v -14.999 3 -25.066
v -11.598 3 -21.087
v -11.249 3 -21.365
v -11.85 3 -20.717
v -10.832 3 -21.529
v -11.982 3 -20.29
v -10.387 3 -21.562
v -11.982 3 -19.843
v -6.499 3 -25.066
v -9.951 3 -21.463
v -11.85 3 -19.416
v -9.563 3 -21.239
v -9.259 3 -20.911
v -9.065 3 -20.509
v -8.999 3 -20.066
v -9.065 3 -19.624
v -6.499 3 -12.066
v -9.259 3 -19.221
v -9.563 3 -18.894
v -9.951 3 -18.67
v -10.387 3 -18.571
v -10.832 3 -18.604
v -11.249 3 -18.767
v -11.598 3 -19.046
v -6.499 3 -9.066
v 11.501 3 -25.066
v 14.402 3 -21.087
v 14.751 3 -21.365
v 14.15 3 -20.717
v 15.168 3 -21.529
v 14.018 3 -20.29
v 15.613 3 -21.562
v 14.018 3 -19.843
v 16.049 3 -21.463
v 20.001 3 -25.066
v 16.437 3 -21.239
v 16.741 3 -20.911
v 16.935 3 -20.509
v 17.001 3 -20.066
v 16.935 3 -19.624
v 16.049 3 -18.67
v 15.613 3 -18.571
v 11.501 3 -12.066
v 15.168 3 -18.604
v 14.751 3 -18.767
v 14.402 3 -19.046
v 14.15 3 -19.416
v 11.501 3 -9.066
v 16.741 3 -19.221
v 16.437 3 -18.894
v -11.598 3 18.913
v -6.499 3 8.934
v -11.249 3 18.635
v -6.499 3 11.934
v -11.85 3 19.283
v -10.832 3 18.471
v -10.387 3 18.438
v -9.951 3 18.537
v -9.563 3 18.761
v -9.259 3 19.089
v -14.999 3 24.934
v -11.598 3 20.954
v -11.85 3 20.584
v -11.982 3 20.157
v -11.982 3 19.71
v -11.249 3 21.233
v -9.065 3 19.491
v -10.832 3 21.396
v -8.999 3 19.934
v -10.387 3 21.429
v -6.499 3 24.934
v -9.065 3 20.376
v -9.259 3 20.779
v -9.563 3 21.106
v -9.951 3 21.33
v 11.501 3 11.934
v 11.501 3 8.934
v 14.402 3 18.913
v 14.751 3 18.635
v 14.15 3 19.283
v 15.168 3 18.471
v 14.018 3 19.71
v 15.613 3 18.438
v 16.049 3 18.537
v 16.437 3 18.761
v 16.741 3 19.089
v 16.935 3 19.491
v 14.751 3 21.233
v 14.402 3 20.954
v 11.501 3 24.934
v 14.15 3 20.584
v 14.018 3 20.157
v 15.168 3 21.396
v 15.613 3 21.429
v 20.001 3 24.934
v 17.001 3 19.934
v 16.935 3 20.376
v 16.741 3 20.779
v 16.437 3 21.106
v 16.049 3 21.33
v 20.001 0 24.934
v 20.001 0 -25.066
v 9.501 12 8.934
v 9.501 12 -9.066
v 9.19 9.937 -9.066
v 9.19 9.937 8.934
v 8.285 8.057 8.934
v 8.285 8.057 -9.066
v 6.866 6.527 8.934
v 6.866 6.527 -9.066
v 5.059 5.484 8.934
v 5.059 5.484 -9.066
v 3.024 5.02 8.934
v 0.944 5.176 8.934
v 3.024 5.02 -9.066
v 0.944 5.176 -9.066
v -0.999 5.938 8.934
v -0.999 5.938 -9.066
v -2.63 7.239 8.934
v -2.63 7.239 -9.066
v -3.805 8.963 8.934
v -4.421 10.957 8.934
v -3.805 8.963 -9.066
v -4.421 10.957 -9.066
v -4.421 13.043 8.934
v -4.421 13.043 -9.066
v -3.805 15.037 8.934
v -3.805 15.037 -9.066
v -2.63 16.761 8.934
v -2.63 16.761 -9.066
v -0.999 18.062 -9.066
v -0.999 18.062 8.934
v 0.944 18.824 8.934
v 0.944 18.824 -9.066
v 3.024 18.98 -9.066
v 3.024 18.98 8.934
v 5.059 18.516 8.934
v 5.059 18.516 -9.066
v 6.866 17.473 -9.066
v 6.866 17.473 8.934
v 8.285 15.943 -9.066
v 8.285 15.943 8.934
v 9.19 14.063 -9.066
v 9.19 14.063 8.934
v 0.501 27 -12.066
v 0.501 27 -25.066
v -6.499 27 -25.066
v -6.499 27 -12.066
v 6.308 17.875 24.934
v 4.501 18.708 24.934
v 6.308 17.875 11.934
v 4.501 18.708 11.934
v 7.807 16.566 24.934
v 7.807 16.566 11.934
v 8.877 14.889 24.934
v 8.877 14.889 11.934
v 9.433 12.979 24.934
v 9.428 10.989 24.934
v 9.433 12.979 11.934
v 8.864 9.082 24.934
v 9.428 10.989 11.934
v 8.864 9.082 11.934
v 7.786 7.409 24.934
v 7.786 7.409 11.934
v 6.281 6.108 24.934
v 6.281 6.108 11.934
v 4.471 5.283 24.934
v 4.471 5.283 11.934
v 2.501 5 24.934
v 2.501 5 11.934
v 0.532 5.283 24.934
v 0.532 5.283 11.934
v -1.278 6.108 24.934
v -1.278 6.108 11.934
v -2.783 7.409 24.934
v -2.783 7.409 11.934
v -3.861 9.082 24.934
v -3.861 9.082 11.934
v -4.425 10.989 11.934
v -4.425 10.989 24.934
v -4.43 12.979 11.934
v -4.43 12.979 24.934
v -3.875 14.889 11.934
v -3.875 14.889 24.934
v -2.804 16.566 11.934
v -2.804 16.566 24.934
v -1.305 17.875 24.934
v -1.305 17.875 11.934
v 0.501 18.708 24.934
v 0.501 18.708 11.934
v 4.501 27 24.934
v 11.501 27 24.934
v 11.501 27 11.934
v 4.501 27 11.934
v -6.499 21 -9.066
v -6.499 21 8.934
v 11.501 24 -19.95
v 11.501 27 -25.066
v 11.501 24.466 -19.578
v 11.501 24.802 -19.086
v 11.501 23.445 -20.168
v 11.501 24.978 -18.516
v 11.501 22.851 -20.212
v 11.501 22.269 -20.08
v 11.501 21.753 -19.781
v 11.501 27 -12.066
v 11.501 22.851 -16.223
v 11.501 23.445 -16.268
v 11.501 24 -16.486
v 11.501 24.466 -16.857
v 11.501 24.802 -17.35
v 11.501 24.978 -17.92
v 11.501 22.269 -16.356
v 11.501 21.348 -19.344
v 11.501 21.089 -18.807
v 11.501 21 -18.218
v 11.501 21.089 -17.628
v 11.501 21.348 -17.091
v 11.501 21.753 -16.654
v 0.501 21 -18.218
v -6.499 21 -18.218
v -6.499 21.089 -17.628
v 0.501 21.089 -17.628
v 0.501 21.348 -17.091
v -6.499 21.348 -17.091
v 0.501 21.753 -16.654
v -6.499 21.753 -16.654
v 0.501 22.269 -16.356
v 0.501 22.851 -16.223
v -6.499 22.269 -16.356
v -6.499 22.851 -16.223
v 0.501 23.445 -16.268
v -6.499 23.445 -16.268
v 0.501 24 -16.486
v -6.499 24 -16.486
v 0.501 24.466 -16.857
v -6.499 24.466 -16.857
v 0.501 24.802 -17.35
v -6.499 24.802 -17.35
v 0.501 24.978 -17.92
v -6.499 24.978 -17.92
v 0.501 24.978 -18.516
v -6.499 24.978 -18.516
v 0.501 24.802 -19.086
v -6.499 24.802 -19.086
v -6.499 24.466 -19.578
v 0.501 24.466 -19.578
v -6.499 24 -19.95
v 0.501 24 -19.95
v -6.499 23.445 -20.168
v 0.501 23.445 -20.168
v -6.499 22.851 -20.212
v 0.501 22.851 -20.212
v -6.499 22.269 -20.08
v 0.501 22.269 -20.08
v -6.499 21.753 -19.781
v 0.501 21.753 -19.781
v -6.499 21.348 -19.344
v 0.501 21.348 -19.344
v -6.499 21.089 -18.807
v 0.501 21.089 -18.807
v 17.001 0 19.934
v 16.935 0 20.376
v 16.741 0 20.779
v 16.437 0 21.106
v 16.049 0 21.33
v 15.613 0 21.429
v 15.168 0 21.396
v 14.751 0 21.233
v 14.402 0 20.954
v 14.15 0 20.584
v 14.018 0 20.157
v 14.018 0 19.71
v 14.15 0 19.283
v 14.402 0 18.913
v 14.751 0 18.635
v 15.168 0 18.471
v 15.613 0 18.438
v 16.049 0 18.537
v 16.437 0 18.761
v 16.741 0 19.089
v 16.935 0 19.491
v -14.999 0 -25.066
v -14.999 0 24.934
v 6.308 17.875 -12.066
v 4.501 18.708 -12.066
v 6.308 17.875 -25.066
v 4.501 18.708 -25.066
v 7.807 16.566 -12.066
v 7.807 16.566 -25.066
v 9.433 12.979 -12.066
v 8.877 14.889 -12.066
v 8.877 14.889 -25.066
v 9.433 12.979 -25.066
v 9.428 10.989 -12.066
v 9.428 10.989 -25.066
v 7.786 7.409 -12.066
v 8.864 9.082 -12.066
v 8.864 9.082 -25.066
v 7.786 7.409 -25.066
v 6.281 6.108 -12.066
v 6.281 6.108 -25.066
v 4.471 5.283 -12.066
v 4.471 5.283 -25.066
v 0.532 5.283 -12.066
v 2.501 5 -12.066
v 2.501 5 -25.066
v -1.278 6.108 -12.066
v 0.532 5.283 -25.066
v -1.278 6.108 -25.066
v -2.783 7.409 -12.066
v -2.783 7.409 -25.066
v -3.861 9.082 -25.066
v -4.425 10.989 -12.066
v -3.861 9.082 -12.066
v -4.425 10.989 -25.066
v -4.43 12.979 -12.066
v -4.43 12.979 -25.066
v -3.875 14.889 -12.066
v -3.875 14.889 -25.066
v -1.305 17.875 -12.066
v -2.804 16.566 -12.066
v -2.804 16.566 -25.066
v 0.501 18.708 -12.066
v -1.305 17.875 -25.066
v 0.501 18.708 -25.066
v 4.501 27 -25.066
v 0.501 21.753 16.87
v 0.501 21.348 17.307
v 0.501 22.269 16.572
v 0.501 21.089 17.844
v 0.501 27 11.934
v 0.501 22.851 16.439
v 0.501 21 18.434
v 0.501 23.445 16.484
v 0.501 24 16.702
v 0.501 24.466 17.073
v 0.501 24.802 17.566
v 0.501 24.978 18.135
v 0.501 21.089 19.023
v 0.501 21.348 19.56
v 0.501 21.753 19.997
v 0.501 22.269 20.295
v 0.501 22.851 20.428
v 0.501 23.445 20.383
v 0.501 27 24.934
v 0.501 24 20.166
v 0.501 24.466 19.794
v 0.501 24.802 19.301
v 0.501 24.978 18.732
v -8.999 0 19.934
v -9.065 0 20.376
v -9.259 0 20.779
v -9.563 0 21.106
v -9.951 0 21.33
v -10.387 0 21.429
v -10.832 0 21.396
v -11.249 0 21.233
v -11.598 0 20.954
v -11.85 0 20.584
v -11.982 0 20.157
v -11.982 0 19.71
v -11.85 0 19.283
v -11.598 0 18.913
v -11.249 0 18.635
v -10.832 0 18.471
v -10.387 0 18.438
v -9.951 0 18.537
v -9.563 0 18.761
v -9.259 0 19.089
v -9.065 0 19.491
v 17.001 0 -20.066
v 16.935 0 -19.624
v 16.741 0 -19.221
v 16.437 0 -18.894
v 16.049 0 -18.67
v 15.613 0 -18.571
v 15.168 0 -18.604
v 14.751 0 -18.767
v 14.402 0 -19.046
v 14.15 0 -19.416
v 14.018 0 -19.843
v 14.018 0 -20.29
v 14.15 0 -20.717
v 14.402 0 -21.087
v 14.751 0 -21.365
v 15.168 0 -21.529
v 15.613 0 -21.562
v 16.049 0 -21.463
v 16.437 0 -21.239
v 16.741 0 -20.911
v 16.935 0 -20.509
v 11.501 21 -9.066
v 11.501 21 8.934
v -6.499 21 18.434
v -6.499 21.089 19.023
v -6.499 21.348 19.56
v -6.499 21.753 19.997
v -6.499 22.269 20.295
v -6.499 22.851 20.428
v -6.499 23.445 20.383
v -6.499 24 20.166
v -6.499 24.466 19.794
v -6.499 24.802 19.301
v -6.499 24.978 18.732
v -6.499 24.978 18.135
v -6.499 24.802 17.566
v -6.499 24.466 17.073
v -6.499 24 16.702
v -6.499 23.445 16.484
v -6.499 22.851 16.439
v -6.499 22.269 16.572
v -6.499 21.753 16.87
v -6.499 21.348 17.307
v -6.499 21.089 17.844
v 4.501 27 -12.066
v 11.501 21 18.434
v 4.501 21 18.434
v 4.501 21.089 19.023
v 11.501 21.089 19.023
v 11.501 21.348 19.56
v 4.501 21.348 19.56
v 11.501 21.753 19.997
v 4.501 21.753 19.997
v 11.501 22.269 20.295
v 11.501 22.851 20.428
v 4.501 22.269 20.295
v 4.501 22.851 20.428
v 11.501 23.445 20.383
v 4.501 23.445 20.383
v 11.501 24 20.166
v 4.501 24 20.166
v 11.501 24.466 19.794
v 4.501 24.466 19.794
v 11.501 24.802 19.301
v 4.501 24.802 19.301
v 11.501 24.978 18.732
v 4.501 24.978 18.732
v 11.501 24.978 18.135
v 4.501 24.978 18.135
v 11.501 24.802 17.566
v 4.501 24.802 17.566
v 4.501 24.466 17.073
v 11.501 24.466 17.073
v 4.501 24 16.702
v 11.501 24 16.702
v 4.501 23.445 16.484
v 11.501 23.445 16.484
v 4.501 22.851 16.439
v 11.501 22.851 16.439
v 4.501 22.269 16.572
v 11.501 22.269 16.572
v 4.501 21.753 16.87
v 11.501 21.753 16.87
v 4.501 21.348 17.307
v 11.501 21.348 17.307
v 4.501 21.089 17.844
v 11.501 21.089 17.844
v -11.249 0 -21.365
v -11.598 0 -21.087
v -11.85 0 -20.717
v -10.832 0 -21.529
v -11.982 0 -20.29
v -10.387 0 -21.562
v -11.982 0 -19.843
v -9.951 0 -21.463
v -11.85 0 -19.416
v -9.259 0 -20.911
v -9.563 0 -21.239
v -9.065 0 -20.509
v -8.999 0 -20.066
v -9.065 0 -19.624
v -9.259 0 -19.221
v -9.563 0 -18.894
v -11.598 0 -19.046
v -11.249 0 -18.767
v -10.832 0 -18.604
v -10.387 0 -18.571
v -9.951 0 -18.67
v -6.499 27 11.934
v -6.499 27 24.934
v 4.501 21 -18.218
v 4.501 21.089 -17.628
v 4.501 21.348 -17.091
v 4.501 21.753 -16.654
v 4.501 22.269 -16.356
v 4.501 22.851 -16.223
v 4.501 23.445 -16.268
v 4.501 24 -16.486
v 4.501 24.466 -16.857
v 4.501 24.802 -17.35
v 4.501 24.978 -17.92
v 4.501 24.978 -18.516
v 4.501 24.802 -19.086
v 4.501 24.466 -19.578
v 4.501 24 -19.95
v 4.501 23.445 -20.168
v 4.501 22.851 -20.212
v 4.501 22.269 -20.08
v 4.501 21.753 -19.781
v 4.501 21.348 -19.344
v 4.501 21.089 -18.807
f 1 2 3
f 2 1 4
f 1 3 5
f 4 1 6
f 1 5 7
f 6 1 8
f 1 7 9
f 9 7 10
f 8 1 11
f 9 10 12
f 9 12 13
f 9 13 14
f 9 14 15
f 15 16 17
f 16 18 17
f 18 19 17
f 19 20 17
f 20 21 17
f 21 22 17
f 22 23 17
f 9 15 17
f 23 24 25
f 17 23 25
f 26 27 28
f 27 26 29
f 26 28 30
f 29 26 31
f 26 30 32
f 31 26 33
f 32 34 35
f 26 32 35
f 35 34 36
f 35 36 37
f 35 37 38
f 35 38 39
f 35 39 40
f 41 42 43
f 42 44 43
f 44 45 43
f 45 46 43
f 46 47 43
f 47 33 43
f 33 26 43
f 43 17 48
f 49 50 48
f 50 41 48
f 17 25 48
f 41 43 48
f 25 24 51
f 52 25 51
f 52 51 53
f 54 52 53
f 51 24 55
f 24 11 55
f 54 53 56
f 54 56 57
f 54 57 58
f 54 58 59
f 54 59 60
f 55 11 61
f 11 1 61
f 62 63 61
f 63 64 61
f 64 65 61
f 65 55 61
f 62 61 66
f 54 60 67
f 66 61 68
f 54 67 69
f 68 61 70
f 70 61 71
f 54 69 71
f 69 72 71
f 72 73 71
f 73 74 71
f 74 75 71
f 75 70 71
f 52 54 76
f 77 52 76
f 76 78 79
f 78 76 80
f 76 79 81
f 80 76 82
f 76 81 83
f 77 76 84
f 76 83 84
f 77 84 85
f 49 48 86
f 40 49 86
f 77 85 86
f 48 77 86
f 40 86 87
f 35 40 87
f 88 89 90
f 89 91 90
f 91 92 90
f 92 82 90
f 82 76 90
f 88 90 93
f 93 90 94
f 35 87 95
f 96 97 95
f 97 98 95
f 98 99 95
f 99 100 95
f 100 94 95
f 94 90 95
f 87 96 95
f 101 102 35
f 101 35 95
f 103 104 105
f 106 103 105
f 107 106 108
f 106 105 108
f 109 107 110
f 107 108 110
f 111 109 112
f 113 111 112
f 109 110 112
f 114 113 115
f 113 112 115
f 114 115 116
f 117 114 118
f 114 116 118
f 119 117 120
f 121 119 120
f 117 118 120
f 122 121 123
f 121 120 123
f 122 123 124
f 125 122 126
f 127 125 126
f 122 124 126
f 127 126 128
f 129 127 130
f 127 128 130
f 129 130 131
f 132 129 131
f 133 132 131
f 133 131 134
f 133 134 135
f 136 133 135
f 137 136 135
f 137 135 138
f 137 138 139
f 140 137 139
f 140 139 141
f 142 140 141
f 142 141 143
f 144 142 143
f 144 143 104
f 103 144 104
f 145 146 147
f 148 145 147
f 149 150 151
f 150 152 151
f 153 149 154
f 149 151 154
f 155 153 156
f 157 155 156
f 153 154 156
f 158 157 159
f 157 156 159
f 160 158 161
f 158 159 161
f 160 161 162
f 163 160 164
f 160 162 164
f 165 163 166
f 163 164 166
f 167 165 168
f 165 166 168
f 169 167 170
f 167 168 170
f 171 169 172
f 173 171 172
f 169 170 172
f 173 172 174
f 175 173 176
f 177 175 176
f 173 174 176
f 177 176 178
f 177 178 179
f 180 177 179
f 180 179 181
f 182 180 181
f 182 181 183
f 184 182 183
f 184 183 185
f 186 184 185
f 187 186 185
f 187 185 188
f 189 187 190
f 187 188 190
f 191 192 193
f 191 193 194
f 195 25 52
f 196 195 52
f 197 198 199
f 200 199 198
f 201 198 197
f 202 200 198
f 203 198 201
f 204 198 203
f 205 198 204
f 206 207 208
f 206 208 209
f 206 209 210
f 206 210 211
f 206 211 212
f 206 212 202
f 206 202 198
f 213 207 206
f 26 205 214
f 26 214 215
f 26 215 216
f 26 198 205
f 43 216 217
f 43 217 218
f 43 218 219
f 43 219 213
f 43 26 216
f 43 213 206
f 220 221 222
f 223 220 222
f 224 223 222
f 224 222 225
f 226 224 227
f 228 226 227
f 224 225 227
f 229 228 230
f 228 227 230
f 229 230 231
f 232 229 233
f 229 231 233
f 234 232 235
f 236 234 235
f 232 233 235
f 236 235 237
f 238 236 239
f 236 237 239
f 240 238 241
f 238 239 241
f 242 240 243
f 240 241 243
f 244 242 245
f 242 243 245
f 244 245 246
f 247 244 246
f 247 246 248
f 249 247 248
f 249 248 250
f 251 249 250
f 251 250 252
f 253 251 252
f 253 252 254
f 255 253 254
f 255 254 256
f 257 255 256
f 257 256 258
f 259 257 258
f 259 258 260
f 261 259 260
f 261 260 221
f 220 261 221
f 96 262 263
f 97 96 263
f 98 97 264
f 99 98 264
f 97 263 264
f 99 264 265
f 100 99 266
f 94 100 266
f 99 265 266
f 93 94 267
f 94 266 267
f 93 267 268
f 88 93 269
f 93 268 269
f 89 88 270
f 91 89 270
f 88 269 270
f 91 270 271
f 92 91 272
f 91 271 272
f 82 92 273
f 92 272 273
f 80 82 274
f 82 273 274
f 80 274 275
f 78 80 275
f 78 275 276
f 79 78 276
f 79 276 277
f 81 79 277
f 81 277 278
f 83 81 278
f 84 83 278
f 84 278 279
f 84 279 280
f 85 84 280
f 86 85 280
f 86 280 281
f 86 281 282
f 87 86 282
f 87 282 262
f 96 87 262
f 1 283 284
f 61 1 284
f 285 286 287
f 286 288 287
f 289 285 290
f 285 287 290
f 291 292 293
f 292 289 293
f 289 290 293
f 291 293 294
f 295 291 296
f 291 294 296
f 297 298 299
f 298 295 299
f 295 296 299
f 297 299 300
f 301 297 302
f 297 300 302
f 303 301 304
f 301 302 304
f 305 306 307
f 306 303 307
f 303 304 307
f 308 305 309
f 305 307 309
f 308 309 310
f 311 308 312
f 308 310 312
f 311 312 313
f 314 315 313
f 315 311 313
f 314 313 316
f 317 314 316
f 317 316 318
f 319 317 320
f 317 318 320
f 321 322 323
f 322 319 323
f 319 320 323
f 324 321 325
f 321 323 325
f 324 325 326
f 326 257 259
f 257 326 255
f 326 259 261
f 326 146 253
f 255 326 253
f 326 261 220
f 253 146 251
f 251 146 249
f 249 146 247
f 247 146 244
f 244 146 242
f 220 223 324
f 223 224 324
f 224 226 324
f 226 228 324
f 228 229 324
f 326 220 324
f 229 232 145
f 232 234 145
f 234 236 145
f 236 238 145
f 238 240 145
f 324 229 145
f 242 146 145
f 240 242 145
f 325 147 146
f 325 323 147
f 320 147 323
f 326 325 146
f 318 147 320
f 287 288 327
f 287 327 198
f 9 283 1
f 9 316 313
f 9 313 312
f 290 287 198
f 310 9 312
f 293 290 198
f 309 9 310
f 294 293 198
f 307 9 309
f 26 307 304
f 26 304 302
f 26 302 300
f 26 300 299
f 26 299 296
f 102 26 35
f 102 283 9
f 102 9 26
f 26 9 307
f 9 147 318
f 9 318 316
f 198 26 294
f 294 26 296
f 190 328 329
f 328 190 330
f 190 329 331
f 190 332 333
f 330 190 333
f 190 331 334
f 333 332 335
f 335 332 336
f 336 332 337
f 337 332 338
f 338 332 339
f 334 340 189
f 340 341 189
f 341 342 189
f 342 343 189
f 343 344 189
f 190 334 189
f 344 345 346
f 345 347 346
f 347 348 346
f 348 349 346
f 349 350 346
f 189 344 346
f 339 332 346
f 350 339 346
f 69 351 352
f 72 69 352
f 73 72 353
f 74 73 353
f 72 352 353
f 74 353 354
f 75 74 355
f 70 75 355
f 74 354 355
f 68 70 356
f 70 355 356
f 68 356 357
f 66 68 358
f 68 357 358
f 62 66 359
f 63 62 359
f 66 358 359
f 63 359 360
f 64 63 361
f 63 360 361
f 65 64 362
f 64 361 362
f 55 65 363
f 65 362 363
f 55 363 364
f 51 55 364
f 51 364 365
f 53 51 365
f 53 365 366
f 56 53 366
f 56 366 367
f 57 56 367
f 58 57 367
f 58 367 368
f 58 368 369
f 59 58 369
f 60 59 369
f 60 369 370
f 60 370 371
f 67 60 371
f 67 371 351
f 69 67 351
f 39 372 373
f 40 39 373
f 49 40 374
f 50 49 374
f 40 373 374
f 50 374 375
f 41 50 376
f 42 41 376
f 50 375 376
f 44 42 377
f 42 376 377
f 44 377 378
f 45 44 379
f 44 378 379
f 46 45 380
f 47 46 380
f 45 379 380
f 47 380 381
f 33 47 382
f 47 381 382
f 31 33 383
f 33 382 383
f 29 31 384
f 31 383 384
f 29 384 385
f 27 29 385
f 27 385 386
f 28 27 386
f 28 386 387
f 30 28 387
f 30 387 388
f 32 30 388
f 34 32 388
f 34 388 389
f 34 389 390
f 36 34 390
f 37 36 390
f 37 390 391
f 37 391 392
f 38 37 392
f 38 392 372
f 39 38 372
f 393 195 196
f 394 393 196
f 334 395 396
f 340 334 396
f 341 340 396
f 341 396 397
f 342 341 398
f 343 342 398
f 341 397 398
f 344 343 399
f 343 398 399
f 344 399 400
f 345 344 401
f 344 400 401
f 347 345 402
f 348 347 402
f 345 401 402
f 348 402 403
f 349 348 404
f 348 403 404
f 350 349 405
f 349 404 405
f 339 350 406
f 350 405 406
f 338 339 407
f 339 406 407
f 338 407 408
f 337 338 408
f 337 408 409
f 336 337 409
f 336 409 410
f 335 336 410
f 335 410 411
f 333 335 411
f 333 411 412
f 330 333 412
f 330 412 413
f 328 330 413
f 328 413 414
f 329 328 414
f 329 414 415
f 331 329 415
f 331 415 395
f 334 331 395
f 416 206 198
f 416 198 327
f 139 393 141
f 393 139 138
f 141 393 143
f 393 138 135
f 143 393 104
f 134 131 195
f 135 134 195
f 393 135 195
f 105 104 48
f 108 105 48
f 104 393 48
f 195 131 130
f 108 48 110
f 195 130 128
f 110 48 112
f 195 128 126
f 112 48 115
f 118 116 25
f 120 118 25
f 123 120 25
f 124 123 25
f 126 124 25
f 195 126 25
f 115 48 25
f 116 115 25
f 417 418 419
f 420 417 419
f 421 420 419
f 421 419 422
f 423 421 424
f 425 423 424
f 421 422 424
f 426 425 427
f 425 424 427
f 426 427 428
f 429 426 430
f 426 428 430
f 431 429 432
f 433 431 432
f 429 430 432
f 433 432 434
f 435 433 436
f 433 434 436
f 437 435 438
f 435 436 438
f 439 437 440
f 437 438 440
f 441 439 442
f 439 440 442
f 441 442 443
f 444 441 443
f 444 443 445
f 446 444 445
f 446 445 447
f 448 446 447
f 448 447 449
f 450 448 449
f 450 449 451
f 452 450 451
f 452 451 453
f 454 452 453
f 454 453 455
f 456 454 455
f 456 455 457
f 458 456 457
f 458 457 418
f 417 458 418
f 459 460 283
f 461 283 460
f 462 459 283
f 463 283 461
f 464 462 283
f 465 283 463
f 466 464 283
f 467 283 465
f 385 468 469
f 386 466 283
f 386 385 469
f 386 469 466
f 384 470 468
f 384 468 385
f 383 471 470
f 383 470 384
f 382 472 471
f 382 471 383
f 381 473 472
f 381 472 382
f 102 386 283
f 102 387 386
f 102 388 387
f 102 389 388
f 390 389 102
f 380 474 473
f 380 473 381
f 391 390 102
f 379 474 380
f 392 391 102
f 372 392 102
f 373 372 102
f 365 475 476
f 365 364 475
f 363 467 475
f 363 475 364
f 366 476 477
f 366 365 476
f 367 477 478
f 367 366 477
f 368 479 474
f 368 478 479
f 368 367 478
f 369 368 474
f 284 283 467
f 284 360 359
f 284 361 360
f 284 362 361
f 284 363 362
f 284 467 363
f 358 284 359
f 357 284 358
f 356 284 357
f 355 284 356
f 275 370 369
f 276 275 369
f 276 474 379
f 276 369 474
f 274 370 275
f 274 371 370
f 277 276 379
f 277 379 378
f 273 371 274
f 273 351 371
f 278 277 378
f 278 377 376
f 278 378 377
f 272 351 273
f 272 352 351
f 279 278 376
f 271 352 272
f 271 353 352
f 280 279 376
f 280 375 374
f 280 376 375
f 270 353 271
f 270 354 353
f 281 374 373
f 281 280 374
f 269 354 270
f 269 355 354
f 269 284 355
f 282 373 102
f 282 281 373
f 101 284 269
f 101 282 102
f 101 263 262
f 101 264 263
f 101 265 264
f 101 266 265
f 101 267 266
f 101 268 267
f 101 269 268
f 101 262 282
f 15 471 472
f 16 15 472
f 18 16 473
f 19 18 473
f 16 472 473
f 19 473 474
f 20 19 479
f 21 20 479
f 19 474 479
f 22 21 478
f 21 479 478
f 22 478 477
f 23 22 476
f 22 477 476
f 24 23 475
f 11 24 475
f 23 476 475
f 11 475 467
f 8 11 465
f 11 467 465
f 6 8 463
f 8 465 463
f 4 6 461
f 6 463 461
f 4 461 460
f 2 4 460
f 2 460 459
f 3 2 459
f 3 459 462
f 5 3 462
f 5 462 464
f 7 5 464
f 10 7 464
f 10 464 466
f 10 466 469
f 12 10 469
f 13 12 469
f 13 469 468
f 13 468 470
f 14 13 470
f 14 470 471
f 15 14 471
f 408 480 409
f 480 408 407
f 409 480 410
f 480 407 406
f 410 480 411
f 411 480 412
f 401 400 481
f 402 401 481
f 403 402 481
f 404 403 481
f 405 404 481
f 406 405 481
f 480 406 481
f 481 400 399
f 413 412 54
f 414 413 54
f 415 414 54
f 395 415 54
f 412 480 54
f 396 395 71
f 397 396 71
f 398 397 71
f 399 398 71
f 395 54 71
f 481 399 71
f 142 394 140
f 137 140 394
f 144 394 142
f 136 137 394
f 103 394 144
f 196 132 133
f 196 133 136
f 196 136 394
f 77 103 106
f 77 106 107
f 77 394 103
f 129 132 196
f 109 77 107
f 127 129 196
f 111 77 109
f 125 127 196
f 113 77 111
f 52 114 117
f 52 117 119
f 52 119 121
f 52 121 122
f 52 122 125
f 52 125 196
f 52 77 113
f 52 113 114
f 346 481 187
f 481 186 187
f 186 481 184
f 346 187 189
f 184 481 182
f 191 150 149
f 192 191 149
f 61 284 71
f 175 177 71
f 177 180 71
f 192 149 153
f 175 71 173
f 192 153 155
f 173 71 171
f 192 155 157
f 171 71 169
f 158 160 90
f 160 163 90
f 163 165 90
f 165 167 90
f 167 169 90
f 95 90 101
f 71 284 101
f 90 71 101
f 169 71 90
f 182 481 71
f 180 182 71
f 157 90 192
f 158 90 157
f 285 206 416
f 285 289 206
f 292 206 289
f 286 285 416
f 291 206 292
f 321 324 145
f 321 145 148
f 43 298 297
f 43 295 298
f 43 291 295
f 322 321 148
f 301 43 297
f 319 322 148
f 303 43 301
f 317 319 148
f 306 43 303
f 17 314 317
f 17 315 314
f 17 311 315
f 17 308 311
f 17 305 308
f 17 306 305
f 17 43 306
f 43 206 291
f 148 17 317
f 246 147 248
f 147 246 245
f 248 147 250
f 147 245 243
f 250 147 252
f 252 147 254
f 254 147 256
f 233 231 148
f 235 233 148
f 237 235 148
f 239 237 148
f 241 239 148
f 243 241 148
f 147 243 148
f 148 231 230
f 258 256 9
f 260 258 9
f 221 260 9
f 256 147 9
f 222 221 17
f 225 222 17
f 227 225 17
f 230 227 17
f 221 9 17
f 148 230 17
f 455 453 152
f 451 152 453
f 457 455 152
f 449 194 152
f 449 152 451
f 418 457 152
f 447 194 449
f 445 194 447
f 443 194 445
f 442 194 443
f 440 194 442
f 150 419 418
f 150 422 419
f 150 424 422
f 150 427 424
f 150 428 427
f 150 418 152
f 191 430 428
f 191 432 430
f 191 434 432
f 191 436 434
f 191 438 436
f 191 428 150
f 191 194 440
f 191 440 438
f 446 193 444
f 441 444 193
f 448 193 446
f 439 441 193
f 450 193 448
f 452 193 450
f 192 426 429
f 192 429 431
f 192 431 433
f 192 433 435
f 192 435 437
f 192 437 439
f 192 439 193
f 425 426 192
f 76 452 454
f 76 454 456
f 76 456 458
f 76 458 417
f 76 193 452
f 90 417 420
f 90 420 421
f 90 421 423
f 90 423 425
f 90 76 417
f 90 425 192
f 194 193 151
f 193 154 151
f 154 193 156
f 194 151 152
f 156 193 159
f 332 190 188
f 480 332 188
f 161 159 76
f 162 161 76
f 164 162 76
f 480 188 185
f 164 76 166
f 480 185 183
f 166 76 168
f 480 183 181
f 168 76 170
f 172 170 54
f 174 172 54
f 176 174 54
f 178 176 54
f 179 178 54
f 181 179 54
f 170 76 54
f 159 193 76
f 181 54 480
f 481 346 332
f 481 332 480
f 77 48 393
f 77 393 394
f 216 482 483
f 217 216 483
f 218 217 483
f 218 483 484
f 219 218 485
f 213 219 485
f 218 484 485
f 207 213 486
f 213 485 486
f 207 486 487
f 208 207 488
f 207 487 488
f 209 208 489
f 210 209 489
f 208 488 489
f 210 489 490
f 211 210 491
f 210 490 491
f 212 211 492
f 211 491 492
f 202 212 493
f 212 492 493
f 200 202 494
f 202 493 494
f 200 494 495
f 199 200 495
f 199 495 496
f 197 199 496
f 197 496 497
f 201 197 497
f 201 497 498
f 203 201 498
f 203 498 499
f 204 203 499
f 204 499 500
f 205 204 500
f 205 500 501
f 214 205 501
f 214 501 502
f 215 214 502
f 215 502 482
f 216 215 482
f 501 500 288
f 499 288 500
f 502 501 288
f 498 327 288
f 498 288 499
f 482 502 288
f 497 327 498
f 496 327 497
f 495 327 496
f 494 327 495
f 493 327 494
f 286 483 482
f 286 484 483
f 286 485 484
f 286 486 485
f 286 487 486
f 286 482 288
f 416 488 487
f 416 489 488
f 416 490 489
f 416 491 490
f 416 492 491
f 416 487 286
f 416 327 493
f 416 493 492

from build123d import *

# Parameters (mm, degrees)
F0_W      = 35
F0_H      = 50
F1_DEPTH  = 3
F2_W      = 18
F2_H      = 13
F2_H_2    = 18
F3_DEPTH  = 24
F4_R      = 7
F5_DEPTH  = 50
F6_R      = 2
F7_DEPTH  = 25
F8_W      = 4
F8_H      = 13
F9_DEPTH  = 10
F10_W     = 4
F10_H     = 13
F11_DEPTH = 10
F12_R     = 1.5
F13_DEPTH = 5
F14_W     = 6
F14_H     = 18
F15_DEPTH = 18


with BuildPart() as f1:
    # F0 (on Front) → F1 (new body)
    with BuildSketch(Plane.XZ):
        with Locations((2.50131, -0.066432)):
            Rectangle(F0_W, F0_H)
    extrude(amount=-F1_DEPTH)

    # F2 (on face) → F3 (join)
    with BuildSketch(Plane(origin=(0, 3, 0), x_dir=(-1, 0, 0), z_dir=(0, 1, 0))):
        with Locations((-2.50131, 18.433568)):
            Rectangle(F2_W, F2_H)
        with Locations((-2.50131, -0.066432)):
            Rectangle(F2_W, F2_H_2)
        with Locations((-2.50131, -18.566432)):
            Rectangle(F2_W, F2_H)
    extrude(amount=F3_DEPTH)

    # F4 (on face) → F5 (cut)
    with BuildSketch(Plane(origin=(0, 0, -25.066432), x_dir=(1, 0, 0), z_dir=(0, 0, -1))):
        with Locations((2.50131, -12)):
            Circle(F4_R)
    extrude(amount=-F5_DEPTH, mode=Mode.SUBTRACT)

    # F6 (on face) → F7 (cut)
    with BuildSketch(Plane(origin=(-6.49869, 0, 0), x_dir=(0, -1, 0), z_dir=(-1, 0, 0))):
        with Locations((-23, 18.433568)):
            Circle(F6_R)
        with Locations((-23, -18.217815)):
            Circle(F6_R)
    extrude(amount=-F7_DEPTH, mode=Mode.SUBTRACT)

    # F8 (on face) → F9 (cut)
    with BuildSketch(Plane(origin=(0, 27, 0), x_dir=(-1, 0, 0), z_dir=(0, 1, 0))):
        with Locations((-2.50131, 18.433568)):
            Rectangle(F8_W, F8_H)
    extrude(amount=-F9_DEPTH, mode=Mode.SUBTRACT)

    # F10 (on face) → F11 (cut)
    with BuildSketch(Plane(origin=(0, 27, 0), x_dir=(-1, 0, 0), z_dir=(0, 1, 0))):
        with Locations((-2.50131, -18.566432)):
            Rectangle(F10_W, F10_H)
    extrude(amount=-F11_DEPTH, mode=Mode.SUBTRACT)

    # F12 (on face) → F13 (cut)
    with BuildSketch(Plane.XZ):
        with Locations((15.50131, 19.933568)):
            Circle(F12_R)
        with Locations((-10.49869, -20.066432)):
            Circle(F12_R)
        with Locations((15.50131, -20.066432)):
            Circle(F12_R)
        with Locations((-10.49869, 19.933568)):
            Circle(F12_R)
    extrude(amount=-F13_DEPTH, mode=Mode.SUBTRACT)

    # F14 (on face) → F15 (cut)
    with BuildSketch(Plane(origin=(-6.49869, 0, 0), x_dir=(0, -1, 0), z_dir=(-1, 0, 0))):
        with Locations((-24, -0.066432)):
            Rectangle(F14_W, F14_H)
    extrude(amount=-F15_DEPTH, mode=Mode.SUBTRACT)


solid = f1.part
